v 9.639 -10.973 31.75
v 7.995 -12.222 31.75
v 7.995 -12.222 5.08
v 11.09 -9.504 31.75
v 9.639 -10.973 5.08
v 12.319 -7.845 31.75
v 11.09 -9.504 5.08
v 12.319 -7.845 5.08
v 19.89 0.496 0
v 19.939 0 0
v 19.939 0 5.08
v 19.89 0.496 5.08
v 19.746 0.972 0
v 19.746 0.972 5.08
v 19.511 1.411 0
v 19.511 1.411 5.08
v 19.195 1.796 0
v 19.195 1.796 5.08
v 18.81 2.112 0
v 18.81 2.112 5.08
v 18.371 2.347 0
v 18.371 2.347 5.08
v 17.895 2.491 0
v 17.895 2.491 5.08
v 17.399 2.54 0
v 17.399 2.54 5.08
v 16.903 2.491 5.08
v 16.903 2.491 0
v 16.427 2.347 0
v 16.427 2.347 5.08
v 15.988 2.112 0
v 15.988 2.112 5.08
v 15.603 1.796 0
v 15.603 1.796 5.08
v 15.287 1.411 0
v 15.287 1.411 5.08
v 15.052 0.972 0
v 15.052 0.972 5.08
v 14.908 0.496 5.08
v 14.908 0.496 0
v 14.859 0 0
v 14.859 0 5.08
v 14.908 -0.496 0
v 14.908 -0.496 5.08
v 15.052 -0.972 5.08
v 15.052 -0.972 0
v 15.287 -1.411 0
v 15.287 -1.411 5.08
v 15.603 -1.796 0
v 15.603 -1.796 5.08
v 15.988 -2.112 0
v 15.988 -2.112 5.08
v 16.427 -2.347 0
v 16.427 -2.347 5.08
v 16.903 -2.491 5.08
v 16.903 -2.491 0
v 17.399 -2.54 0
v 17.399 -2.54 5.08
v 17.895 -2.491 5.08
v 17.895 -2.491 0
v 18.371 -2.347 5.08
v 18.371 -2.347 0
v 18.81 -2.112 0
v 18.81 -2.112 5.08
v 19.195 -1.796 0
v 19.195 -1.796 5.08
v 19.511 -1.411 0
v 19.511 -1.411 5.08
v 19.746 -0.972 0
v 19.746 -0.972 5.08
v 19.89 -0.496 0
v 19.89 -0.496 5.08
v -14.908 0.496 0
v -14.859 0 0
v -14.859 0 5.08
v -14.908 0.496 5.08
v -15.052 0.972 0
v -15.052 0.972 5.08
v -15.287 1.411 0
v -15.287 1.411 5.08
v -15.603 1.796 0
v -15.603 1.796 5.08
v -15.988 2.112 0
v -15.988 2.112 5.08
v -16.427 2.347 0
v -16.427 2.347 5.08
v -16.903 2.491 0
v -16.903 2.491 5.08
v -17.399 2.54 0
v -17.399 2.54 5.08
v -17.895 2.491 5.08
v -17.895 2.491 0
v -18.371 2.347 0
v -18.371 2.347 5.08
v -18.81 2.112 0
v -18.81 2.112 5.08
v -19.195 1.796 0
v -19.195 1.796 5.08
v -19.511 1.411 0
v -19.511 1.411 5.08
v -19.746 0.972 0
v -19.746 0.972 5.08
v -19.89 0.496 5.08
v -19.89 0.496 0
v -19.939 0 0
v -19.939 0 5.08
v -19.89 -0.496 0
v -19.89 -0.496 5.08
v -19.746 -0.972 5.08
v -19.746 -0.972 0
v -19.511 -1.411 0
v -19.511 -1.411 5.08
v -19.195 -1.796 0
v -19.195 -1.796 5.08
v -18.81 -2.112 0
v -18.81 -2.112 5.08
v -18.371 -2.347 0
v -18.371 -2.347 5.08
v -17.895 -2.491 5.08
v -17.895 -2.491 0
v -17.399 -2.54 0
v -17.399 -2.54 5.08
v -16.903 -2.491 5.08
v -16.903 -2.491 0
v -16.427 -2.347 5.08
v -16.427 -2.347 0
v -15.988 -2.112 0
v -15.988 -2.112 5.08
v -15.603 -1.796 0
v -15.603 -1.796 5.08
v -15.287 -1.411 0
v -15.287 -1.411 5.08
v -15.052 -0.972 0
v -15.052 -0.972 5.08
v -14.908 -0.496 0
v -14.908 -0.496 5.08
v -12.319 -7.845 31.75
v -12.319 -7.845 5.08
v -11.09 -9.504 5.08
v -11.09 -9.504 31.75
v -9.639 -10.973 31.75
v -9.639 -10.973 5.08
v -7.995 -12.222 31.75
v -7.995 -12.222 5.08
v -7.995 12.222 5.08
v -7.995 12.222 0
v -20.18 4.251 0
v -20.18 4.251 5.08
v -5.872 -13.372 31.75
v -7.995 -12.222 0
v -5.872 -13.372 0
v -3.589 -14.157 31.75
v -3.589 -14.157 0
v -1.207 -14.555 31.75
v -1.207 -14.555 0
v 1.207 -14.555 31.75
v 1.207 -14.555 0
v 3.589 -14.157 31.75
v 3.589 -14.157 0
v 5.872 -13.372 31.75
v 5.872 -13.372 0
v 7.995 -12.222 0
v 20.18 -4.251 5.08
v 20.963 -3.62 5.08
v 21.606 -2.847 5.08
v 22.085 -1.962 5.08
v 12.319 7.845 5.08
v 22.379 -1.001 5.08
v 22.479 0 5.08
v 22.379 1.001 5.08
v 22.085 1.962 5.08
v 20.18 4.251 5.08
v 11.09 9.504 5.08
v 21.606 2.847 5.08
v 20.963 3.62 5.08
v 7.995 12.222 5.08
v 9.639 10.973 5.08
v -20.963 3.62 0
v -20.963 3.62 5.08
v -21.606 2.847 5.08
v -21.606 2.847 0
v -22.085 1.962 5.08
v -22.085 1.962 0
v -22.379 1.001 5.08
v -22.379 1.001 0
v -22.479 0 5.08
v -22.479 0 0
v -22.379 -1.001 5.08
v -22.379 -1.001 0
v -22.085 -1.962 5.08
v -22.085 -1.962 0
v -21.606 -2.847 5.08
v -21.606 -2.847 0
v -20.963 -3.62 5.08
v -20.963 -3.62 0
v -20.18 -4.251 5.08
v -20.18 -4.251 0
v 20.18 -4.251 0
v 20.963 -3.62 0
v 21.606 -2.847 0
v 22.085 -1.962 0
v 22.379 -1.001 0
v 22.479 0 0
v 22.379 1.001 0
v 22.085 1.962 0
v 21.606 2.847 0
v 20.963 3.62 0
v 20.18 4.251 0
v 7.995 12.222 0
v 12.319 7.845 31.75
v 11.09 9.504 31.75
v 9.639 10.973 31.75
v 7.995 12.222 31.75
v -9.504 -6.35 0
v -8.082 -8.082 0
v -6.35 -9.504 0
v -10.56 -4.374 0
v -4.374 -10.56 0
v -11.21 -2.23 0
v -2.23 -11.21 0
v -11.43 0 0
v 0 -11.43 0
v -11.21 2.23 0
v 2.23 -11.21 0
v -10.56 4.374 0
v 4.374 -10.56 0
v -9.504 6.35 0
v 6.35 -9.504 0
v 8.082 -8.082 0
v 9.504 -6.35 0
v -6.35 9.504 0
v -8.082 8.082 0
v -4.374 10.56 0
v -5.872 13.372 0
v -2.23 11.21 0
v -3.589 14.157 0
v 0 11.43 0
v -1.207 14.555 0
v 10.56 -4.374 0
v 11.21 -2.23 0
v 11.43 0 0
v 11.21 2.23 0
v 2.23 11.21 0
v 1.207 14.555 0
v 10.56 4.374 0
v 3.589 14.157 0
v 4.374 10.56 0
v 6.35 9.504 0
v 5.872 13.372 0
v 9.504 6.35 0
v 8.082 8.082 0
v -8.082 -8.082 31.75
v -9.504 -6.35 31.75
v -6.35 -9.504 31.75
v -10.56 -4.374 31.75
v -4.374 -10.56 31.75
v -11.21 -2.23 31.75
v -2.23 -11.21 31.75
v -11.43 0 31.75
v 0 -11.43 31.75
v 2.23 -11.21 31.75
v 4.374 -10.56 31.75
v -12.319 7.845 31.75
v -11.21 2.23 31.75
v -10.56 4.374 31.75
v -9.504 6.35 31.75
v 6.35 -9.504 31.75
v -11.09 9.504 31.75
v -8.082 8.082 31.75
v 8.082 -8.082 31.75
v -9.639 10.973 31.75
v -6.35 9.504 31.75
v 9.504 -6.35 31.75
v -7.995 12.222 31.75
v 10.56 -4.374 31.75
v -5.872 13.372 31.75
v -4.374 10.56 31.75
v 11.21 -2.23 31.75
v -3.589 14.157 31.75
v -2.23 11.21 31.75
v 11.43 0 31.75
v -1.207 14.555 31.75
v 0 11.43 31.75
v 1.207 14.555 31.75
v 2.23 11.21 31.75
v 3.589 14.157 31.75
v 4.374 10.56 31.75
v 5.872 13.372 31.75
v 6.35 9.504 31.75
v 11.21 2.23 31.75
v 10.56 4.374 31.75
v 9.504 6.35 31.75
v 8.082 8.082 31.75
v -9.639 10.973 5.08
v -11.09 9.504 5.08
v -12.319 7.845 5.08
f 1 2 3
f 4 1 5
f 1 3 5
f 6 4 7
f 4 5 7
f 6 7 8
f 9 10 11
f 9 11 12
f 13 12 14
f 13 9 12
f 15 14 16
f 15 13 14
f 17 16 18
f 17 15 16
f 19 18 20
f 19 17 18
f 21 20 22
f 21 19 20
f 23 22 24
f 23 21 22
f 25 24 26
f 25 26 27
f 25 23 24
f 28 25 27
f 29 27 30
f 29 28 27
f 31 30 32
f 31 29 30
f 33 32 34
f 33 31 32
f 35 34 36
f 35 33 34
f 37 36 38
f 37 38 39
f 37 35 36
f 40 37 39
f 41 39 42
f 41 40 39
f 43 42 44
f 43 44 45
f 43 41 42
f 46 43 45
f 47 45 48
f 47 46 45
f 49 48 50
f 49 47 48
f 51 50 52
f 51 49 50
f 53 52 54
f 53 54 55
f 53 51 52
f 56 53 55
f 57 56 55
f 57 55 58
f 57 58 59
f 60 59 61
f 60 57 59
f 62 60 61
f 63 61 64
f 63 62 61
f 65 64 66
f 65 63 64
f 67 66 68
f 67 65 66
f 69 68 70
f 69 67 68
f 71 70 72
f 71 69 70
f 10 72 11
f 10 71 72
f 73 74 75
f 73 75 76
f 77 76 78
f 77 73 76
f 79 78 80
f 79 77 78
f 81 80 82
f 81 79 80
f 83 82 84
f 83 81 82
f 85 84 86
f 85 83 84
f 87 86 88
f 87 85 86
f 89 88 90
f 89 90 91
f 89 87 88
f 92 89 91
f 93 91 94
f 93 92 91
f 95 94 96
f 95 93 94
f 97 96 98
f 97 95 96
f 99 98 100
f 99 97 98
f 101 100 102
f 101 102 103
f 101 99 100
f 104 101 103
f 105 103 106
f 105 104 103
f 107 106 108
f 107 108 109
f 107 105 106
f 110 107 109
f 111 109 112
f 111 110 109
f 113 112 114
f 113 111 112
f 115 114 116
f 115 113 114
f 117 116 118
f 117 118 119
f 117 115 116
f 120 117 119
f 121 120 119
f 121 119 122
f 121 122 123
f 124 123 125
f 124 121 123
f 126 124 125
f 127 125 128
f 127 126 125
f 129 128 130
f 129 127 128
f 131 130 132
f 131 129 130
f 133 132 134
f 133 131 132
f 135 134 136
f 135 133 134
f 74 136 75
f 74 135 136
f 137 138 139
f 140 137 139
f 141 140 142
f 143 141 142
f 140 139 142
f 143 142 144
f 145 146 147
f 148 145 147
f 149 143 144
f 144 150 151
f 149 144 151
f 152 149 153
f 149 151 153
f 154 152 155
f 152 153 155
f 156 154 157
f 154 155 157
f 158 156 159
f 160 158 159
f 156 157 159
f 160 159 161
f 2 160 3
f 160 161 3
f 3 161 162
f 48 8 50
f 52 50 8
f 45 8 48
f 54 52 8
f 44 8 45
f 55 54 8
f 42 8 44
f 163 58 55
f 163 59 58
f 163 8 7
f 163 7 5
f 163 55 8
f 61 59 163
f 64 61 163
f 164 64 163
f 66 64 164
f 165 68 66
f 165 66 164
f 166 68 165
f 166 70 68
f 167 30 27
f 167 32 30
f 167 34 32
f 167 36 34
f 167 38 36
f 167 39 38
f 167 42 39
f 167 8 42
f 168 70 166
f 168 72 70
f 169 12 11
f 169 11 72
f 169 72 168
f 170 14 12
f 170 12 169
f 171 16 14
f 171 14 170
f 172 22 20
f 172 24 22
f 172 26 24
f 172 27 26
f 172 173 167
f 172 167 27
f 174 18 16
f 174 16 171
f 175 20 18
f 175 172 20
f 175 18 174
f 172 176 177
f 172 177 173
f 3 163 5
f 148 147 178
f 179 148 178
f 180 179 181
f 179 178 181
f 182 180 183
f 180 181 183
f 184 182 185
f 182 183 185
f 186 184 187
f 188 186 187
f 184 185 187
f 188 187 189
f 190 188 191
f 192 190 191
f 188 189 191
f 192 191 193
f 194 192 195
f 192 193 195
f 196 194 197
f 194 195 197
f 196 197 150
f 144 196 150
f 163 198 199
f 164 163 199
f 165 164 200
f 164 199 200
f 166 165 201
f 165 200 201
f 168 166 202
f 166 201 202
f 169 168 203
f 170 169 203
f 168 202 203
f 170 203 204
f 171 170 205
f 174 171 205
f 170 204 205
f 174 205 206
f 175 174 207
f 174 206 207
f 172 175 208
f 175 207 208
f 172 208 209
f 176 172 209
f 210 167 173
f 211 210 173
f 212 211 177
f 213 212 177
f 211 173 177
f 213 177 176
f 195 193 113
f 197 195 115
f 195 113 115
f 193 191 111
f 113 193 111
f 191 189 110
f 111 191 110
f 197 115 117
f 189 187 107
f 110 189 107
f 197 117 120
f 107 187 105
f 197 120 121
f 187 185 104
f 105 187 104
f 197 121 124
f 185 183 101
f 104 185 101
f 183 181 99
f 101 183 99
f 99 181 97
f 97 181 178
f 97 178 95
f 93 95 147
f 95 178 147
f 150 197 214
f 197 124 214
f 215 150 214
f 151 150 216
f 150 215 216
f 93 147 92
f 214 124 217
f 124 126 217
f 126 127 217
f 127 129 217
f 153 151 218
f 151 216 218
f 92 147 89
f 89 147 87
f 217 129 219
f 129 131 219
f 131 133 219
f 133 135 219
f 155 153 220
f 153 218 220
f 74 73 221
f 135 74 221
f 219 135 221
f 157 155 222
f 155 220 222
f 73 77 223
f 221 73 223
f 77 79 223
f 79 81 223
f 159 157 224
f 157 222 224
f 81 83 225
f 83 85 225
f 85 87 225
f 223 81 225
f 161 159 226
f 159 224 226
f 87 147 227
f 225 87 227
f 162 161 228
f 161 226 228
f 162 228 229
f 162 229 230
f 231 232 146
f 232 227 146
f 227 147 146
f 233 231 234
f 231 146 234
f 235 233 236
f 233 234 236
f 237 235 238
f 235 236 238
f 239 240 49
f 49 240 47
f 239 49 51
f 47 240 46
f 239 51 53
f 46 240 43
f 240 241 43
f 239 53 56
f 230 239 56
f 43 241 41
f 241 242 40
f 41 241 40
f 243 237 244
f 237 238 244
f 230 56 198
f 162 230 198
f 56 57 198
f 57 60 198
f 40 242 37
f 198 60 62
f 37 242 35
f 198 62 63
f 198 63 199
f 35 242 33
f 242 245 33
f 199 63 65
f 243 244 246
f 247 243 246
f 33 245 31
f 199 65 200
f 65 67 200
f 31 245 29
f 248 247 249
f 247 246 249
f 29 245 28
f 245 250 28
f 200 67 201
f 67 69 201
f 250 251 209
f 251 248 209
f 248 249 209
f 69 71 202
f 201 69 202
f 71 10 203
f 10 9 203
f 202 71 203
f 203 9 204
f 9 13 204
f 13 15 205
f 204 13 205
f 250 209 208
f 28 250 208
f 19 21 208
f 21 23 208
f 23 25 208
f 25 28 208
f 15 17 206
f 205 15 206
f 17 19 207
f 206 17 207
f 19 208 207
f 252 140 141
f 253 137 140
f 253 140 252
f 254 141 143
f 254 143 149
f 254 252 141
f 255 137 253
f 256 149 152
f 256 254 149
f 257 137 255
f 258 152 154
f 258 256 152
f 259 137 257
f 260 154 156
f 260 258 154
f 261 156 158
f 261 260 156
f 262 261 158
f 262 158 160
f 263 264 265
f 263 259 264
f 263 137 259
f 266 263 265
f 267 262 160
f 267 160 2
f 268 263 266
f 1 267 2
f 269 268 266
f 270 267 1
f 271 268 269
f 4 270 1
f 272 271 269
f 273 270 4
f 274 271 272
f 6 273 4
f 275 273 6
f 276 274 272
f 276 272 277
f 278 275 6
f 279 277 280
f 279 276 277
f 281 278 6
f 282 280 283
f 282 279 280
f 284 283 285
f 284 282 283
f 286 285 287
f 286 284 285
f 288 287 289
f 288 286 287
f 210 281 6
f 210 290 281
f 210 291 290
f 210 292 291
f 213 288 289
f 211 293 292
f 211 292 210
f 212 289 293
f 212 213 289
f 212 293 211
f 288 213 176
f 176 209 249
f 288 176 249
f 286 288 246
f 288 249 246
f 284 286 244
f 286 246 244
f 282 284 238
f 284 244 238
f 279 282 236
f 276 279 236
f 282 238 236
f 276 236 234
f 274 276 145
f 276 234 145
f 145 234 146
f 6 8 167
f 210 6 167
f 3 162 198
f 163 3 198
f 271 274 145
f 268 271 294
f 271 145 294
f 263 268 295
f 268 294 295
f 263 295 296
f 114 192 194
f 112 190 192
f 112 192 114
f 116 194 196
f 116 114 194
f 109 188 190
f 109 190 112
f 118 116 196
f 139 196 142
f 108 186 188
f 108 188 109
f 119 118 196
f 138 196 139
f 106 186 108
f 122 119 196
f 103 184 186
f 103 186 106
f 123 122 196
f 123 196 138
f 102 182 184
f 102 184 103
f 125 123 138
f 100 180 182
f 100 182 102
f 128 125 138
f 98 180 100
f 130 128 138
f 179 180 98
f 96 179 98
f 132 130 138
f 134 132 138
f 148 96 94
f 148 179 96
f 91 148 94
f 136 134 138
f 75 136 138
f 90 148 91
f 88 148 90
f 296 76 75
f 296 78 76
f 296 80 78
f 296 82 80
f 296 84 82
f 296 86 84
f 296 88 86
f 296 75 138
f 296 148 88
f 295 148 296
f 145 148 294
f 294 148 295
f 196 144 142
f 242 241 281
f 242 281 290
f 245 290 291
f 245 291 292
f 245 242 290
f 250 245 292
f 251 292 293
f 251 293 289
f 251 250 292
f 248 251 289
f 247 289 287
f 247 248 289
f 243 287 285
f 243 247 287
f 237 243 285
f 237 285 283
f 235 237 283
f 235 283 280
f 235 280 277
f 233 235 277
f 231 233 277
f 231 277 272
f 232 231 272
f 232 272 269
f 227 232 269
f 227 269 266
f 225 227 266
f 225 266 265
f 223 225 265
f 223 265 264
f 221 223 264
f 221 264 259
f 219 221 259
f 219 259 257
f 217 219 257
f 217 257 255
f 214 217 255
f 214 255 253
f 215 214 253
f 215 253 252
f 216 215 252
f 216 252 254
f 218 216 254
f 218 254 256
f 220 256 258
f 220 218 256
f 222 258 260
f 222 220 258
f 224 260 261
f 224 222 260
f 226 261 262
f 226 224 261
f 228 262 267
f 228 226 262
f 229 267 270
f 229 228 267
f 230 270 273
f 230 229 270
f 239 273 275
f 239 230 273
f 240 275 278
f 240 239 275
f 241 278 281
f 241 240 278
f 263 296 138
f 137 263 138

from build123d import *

# Parameters (mm, degrees)
F0_R     = 11.43
F0_R_2   = 2.54
F2_DEPTH = 5.08
F1_R     = 11.43
F3_DEPTH = 31.75


with BuildPart() as f2:
    # F0 (on Top) → F2 (new body)
    with BuildSketch(Plane.XY):
        with BuildLine():
            Line((12.319, 0), (12.319, 7.84527))
            ThreePointArc((12.319, 7.84527), (10.390293, 10.263909), (7.995438, 12.22207))
            ThreePointArc((7.995438, 12.22207), (0, 14.605), (-7.995438, 12.22207))
            ThreePointArc((-7.995438, 12.22207), (-10.390293, 10.263909), (-12.319, 7.84527))
            Line((-12.319, 7.84527), (-12.319, 0))
            Line((-12.319, 0), (-12.319, -7.84527))
            ThreePointArc((-12.319, -7.84527), (-10.390293, -10.263909), (-7.995438, -12.22207))
            ThreePointArc((-7.995438, -12.22207), (0, -14.605), (7.995438, -12.22207))
            ThreePointArc((7.995438, -12.22207), (10.390293, -10.263909), (12.319, -7.84527))
            Line((12.319, -7.84527), (12.319, 0))
        make_face()
        Circle(F0_R, mode=Mode.SUBTRACT)
        with BuildLine():
            ThreePointArc((7.995438, 12.22207), (10.390293, 10.263909), (12.319, 7.84527))
            Line((12.319, 7.84527), (12.319, 0))
            Line((12.319, 0), (12.319, -7.84527))
            ThreePointArc((12.319, -7.84527), (10.390293, -10.263909), (7.995438, -12.22207))
            Line((7.995438, -12.22207), (20.180022, -4.251155))
            ThreePointArc((20.180022, -4.251155), (22.479, 0), (20.180022, 4.251155))
            Line((20.180022, 4.251155), (7.995438, 12.22207))
        make_face()
        with Locations((17.399, 0)):
            Circle(F0_R_2, mode=Mode.SUBTRACT)
        with BuildLine():
            ThreePointArc((-12.319, 7.84527), (-10.390293, 10.263909), (-7.995438, 12.22207))
            Line((-7.995438, 12.22207), (-20.180022, 4.251155))
            ThreePointArc((-20.180022, 4.251155), (-22.479, 0), (-20.180022, -4.251155))
            Line((-20.180022, -4.251155), (-7.995438, -12.22207))
            ThreePointArc((-7.995438, -12.22207), (-10.390293, -10.263909), (-12.319, -7.84527))
            Line((-12.319, -7.84527), (-12.319, 0))
            Line((-12.319, 0), (-12.319, 7.84527))
        make_face()
        with Locations((-17.399, 0)):
            Circle(F0_R_2, mode=Mode.SUBTRACT)
    extrude(amount=F2_DEPTH)

    # F1 (on face) → F3 (join)
    with BuildSketch(Plane.XY):
        with BuildLine():
            Line((12.319, -7.84527), (12.319, 0))
            Line((12.319, 0), (12.319, 7.84527))
            ThreePointArc((12.319, 7.84527), (10.390293, 10.263909), (7.995438, 12.22207))
            ThreePointArc((7.995438, 12.22207), (0, 14.605), (-7.995438, 12.22207))
            ThreePointArc((-7.995438, 12.22207), (-10.390293, 10.263909), (-12.319, 7.84527))
            Line((-12.319, 7.84527), (-12.319, 0))
            Line((-12.319, 0), (-12.319, -7.84527))
            ThreePointArc((-12.319, -7.84527), (-10.390293, -10.263909), (-7.995438, -12.22207))
            ThreePointArc((-7.995438, -12.22207), (0, -14.605), (7.995438, -12.22207))
            ThreePointArc((7.995438, -12.22207), (10.390293, -10.263909), (12.319, -7.84527))
        make_face()
        Circle(F1_R, mode=Mode.SUBTRACT)
    extrude(amount=F3_DEPTH)


solid = f2.part
